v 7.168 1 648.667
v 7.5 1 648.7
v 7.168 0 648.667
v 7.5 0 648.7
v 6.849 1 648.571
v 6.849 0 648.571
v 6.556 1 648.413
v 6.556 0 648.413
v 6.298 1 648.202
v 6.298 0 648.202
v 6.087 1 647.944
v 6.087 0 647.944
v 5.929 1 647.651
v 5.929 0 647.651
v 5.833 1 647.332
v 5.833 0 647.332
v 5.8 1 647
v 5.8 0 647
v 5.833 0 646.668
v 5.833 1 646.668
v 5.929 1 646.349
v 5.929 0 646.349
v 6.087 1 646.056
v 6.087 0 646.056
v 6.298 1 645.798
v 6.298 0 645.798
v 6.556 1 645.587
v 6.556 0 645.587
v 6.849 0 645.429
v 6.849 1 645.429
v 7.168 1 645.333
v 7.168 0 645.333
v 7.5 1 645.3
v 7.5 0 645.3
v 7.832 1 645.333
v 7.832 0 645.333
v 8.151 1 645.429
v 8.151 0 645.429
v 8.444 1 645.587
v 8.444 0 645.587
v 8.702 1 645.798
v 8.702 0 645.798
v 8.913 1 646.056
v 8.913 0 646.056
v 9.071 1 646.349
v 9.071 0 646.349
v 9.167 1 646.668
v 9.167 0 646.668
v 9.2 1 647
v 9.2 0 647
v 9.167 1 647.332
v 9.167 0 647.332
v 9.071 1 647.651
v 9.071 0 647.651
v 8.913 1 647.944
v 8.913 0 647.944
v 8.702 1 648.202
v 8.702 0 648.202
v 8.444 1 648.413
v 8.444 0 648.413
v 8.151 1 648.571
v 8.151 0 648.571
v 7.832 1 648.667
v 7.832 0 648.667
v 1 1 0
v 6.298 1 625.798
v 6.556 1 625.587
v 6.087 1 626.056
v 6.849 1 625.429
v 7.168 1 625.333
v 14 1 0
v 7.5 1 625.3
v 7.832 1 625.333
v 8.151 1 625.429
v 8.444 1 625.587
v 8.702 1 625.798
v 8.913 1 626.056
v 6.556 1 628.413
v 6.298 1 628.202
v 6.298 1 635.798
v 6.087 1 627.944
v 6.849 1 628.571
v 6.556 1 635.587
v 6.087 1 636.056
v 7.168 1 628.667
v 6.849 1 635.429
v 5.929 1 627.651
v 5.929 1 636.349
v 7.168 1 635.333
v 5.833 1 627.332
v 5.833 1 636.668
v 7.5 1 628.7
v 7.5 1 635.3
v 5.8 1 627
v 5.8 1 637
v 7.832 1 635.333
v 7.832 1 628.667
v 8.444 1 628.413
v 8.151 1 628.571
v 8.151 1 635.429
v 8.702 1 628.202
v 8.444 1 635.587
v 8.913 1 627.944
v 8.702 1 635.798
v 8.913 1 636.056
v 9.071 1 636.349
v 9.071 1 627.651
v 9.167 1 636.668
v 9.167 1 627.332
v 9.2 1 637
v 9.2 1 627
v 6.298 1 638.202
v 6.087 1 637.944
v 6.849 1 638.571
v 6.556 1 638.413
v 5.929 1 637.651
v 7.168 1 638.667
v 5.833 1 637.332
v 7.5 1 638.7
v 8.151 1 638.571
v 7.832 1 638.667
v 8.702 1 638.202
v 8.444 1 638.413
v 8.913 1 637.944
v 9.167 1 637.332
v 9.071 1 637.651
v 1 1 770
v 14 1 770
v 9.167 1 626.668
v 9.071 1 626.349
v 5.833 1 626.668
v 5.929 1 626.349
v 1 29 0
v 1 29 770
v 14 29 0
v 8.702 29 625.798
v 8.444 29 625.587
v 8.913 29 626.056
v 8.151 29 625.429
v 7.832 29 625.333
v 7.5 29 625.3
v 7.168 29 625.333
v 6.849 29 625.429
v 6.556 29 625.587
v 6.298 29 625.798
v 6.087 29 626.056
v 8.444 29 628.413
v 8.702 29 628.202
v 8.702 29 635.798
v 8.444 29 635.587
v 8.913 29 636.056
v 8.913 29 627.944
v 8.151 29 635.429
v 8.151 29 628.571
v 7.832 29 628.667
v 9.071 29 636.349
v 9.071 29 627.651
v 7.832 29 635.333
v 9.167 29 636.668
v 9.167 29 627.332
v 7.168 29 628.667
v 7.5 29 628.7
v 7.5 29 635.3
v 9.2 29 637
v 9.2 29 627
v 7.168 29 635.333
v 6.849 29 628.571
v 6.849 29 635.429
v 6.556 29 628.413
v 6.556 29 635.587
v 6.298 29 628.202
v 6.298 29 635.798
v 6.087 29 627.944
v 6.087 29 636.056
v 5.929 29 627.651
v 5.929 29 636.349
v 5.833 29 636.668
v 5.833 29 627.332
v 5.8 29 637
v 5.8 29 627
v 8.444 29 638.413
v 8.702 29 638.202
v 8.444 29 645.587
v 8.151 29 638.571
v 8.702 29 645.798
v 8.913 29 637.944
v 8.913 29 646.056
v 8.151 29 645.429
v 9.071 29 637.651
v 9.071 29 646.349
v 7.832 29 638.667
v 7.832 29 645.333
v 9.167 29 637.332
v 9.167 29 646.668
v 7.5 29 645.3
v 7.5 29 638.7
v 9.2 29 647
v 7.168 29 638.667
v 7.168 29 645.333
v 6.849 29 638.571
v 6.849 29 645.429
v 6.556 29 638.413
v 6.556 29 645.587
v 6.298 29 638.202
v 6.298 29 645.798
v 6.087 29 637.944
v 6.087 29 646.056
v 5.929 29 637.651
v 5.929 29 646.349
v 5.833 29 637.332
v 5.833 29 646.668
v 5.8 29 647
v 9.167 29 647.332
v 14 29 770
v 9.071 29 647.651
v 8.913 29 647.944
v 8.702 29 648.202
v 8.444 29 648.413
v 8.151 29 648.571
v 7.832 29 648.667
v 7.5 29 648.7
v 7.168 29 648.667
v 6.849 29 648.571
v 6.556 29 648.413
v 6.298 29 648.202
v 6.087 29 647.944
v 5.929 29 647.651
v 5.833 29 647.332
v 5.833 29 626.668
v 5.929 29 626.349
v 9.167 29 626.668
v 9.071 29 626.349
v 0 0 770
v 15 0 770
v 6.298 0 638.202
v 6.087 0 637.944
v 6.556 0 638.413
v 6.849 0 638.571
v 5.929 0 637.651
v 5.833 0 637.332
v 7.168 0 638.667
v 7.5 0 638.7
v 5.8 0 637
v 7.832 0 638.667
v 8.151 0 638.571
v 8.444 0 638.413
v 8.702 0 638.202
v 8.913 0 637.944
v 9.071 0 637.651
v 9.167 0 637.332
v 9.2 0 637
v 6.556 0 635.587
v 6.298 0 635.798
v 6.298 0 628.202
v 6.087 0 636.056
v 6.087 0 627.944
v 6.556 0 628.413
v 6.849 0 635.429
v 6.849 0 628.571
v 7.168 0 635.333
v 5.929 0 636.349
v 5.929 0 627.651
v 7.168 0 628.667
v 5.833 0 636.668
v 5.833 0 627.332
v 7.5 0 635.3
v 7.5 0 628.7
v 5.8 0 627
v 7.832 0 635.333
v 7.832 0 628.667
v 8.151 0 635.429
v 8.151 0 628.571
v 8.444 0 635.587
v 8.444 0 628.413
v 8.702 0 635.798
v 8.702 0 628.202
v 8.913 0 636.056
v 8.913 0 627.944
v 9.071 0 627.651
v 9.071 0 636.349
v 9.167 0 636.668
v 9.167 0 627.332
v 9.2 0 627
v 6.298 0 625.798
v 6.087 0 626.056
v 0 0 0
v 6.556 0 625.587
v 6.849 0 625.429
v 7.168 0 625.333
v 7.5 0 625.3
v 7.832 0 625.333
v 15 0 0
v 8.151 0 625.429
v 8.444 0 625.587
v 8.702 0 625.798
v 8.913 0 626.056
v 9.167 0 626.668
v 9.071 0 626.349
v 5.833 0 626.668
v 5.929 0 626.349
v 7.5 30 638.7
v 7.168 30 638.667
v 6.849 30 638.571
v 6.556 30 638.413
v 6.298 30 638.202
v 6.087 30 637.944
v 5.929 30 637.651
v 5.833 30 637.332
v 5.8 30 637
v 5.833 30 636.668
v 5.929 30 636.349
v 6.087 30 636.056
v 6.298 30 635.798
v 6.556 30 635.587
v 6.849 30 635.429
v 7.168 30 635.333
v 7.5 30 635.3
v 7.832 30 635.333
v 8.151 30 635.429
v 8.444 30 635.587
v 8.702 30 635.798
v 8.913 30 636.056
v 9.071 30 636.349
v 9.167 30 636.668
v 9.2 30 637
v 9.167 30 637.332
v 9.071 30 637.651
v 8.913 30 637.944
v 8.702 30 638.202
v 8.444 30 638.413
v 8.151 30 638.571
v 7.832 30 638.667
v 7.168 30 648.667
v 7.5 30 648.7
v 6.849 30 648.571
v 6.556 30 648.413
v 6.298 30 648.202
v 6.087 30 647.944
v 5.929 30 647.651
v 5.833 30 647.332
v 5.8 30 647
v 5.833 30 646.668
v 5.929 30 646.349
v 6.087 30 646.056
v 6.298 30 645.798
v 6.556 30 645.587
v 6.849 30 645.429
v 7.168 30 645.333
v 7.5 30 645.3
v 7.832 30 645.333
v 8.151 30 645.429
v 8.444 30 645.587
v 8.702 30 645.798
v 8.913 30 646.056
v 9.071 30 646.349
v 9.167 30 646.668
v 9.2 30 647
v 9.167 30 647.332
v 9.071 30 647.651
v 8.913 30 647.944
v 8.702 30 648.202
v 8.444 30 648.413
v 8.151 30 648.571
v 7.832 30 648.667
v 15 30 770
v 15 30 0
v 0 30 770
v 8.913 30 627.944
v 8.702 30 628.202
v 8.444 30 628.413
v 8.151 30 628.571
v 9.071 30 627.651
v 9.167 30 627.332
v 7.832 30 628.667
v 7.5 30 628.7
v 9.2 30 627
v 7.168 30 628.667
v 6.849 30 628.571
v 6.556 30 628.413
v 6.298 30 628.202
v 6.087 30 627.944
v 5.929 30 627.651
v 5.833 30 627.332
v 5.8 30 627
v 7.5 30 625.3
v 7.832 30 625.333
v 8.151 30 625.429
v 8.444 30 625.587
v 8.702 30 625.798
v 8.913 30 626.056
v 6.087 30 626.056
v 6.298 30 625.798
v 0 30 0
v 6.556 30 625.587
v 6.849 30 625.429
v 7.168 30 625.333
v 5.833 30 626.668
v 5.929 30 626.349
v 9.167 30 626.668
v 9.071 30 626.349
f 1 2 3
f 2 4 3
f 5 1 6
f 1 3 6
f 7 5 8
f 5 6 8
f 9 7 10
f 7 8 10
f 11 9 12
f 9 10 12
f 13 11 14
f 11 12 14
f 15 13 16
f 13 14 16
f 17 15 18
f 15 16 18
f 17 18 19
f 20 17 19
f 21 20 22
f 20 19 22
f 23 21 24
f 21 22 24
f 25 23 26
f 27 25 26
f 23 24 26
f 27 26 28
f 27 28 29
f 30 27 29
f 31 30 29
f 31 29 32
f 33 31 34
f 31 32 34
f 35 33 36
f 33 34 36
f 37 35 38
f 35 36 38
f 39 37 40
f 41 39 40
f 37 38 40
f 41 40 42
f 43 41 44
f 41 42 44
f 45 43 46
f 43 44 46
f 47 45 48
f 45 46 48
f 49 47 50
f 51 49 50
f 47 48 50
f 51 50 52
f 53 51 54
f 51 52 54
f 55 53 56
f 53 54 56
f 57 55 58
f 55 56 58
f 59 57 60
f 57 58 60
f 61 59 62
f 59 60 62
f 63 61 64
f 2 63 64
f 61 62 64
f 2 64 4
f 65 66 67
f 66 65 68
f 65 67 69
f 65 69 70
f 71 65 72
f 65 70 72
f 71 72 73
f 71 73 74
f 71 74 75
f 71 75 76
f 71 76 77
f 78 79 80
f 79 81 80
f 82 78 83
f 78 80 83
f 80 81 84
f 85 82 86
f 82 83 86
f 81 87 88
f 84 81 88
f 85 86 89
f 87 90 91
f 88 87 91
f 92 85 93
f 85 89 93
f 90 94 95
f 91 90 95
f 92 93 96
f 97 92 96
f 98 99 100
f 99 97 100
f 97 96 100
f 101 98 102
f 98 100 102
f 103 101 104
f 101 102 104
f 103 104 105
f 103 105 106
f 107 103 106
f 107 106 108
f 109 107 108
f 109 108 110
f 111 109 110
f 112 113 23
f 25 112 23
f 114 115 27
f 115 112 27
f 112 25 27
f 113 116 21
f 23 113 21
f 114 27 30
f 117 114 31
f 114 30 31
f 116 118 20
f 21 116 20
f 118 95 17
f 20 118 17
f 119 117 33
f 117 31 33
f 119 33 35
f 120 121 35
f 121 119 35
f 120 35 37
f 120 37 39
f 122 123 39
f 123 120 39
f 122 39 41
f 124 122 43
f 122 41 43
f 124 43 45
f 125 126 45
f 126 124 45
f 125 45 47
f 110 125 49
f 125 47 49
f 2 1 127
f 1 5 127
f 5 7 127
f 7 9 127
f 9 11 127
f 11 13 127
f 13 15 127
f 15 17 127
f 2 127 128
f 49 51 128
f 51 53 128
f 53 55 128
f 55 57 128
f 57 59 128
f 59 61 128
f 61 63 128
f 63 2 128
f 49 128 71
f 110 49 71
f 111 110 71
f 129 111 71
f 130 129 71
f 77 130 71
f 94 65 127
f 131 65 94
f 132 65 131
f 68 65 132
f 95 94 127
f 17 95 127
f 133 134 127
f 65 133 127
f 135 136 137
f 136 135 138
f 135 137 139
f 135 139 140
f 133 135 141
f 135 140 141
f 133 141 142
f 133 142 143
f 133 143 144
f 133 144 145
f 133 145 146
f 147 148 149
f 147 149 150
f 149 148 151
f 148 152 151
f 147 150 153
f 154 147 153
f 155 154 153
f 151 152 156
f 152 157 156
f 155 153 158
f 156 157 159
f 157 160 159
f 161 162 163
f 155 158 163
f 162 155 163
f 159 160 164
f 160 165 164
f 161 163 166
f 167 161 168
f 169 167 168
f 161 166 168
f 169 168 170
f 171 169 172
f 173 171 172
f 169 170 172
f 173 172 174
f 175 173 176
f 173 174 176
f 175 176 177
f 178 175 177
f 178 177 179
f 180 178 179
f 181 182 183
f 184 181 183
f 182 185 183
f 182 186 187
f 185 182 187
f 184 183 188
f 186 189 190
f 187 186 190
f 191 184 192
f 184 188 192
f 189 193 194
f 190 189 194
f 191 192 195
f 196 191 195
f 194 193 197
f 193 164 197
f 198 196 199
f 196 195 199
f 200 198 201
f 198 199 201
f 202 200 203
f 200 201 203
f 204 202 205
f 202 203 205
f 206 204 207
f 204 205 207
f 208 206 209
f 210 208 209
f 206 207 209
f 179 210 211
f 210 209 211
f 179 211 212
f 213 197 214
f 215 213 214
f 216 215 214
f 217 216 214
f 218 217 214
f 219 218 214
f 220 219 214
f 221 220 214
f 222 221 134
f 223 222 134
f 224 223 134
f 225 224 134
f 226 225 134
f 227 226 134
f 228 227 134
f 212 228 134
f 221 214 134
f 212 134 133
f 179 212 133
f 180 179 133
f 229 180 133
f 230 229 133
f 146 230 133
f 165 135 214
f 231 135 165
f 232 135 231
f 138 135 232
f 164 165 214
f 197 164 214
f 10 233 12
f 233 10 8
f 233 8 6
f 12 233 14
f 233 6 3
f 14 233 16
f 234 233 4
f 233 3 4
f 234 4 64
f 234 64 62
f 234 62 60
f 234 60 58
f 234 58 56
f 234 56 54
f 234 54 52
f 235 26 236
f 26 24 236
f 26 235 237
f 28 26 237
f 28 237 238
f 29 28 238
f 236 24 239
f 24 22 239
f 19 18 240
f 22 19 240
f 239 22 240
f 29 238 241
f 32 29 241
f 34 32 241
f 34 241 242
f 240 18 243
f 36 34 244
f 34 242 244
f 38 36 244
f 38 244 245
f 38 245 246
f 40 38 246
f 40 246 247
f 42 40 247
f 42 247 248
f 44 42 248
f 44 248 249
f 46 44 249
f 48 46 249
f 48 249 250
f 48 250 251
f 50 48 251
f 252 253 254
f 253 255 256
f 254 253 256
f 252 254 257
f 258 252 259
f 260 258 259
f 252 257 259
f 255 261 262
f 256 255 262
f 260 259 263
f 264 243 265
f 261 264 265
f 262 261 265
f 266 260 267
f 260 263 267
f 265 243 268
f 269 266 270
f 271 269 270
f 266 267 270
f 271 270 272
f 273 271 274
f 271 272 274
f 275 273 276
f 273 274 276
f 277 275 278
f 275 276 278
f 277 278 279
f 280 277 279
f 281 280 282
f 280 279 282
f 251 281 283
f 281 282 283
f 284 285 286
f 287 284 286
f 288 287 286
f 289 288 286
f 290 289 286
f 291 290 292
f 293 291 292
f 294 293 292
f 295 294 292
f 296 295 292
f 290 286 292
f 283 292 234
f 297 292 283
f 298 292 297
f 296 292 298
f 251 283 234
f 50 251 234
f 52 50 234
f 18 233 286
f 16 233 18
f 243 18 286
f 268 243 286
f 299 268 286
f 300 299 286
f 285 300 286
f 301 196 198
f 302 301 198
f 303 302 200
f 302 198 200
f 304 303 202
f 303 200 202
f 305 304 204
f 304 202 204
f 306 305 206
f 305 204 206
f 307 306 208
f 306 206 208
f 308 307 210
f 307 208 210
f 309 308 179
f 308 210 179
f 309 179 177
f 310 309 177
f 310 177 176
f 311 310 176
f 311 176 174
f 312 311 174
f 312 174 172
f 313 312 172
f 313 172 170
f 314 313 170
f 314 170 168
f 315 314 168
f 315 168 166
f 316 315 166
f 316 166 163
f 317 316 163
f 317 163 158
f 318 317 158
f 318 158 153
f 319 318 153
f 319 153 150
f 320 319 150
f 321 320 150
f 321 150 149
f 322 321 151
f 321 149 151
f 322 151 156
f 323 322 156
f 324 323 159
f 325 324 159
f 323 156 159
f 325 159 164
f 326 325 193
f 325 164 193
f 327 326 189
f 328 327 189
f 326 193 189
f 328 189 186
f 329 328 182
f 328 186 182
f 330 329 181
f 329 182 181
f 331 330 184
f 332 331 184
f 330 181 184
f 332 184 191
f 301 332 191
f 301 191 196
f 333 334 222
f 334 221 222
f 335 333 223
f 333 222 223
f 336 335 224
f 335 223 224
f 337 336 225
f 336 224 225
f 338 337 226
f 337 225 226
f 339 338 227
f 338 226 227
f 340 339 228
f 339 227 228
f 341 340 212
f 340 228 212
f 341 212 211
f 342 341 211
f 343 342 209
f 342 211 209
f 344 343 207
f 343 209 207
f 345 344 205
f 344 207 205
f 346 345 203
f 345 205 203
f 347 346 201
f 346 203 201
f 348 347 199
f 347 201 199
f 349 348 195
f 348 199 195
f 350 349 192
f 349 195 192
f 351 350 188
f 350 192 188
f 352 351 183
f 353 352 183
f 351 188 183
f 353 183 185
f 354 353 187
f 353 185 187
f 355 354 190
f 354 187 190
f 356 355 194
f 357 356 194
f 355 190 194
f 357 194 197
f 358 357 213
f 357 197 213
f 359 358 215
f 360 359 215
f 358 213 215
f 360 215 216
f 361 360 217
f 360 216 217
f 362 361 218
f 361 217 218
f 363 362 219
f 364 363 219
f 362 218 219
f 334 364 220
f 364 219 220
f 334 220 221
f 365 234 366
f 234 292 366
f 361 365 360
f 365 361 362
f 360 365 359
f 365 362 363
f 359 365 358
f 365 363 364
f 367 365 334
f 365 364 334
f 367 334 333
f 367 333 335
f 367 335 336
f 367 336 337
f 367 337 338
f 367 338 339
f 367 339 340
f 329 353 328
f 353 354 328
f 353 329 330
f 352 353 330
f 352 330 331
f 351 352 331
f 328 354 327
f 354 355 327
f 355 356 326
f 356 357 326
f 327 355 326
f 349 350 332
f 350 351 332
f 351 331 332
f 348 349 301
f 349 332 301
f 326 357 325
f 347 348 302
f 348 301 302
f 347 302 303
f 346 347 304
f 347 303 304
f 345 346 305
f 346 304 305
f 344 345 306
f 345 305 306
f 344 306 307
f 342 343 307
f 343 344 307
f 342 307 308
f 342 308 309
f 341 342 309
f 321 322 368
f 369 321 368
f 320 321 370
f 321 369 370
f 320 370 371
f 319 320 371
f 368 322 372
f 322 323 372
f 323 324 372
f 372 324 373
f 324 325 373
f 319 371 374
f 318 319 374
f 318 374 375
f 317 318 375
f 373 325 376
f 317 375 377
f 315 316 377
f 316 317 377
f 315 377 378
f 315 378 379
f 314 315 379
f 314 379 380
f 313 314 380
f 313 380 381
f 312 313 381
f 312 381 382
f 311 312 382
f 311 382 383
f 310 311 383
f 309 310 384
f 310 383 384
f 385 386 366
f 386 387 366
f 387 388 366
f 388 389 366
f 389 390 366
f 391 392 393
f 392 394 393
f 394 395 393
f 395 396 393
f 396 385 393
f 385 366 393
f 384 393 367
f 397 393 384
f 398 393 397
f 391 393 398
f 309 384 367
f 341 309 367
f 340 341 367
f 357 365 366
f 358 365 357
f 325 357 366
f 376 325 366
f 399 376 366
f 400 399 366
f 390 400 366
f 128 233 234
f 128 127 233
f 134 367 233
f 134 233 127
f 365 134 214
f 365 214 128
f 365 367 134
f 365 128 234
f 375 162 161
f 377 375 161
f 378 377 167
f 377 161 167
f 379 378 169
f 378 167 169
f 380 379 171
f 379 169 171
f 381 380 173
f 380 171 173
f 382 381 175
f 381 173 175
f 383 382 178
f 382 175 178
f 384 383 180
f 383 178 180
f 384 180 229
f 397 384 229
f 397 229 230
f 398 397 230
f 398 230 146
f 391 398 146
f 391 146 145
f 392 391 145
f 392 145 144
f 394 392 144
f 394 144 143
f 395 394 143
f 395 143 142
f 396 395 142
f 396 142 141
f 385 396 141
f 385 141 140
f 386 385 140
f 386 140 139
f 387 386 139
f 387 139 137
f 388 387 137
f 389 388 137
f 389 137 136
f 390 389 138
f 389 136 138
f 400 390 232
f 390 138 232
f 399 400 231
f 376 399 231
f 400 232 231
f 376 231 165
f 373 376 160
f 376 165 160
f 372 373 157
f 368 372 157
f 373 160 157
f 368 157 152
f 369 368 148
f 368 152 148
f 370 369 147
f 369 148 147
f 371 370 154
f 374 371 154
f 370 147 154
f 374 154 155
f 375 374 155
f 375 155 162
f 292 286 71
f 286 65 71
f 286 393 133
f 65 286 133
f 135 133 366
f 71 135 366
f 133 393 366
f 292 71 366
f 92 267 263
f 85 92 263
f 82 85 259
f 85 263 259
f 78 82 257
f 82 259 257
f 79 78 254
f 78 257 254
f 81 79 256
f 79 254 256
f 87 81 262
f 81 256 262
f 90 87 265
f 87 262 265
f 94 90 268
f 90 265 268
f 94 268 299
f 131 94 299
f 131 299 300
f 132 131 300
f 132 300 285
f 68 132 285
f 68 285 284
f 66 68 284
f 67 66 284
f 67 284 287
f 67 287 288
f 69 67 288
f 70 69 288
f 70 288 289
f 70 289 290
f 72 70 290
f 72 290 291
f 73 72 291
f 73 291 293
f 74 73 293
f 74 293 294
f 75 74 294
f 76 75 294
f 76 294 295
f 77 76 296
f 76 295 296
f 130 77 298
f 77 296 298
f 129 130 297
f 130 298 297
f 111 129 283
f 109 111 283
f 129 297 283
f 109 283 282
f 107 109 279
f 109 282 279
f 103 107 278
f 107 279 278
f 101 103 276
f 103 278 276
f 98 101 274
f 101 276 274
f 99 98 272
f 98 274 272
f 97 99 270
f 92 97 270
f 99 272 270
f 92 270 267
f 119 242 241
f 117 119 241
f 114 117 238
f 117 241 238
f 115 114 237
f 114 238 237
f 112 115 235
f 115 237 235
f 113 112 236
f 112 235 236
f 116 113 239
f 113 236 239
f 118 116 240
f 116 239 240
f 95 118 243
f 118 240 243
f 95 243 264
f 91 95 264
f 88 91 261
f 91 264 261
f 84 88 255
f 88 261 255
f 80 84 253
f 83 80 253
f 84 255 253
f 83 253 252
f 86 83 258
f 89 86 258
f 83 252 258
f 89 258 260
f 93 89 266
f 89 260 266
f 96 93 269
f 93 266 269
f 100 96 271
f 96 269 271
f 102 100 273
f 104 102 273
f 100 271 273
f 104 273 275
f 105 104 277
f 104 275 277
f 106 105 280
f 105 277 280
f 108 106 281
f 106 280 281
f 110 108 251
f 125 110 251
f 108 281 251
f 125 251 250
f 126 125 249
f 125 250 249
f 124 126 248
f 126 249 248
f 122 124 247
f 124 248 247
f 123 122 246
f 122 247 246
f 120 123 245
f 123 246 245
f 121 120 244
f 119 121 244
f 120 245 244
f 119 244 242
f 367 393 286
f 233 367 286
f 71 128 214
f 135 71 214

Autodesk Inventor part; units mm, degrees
ref_plane "YZ Plane" through (0, 0, 0) normal (1, 0, 0) x (0, 1, 0)
ref_plane "XZ Plane" through (0, 0, 0) normal (0, 1, 0) x (-1, 0, 0)
ref_plane "XY Plane" through (0, 0, 0) normal (0, 0, 1) x (1, 0, 0)
sketch "スケッチ1" plane through (0, 0, 0) normal (0, 0, 1) x (1, 0, 0)
  point P0 (0, 0)
sketch "スケッチ2" plane through (0, 0, 0) normal (0, 0, 1) x (1, 0, 0)
  line L0 (0, 0) -> (15, 0)
  line L1 (15, 0) -> (15, 30)
  line L2 (15, 30) -> (0, 30)
  line L3 (0, 30) -> (0, 0)
  dimension "d0" = 15
  dimension "d1" = 30
extrude "押し出し1" add sketch "スケッチ2" along normal blind 770
sketch "スケッチ3" plane through (0, 0, 770) normal (0, 0, 1) x (1, 0, 0)
  line L0 (1, 1) -> (14, 1)
  line L1 (14, 1) -> (14, 29)
  line L2 (14, 29) -> (1, 29)
  line L3 (1, 29) -> (1, 1)
  line L4 (0, 30) -> (0, 0) projected
  line L5 (0, 0) -> (15, 0) projected
  dimension "d4" = 13
  dimension "d5" = 28
  dimension "d6" = 1
  dimension "d7" = 1
extrude "押し出し2" cut sketch "スケッチ3" against normal blind 770
sketch "スケッチ4" plane through (0, 30, 770) normal (0, 1, 0) x (1, 0, 0)
  circle A0 centre (7.5, 123) radius 1.65
  line L0 (0, 770) -> (0, 0) projected
  line L1 (15, 0) -> (0, 0) projected
  circle A1 centre (7.5, 133) radius 1.65
  circle A2 centre (7.5, 143) radius 1.65
  dimension "d10" = 3.3
  dimension "d11" = 7.5
  dimension "d12" = 123
  dimension "d13" = 3.3
  dimension "d14" = 3.3
  dimension "d15" = 10
  dimension "d16" = 7.5
  dimension "d17" = 10
  dimension "d18" = 7.5
hole "穴1" at (7.5, 30, 647) at (7.5, 30, 637) at (7.5, 30, 627) direction (0, -1, 0) diameter 3.4 depth 30
equation "\"BendRadius\" = Thickness"
equation "\"BendReliefWidth\" = Thickness"
equation "\"BendReliefDepth\" = 0.5 * Thickness"
equation "\"CornerReliefSize\" = 4 * Thickness"
equation "\"MinimumRemnant\" = 2 * Thickness"
equation "\"TransitionRadius\" = BendRadius"
equation "\"JacobiRadiusSize\" = BendRadius"
equation "\"GapSize\" = Thickness"
equation "\"Thickness\" = 3.048"
properties part number "オムニ_角柱1_N"
